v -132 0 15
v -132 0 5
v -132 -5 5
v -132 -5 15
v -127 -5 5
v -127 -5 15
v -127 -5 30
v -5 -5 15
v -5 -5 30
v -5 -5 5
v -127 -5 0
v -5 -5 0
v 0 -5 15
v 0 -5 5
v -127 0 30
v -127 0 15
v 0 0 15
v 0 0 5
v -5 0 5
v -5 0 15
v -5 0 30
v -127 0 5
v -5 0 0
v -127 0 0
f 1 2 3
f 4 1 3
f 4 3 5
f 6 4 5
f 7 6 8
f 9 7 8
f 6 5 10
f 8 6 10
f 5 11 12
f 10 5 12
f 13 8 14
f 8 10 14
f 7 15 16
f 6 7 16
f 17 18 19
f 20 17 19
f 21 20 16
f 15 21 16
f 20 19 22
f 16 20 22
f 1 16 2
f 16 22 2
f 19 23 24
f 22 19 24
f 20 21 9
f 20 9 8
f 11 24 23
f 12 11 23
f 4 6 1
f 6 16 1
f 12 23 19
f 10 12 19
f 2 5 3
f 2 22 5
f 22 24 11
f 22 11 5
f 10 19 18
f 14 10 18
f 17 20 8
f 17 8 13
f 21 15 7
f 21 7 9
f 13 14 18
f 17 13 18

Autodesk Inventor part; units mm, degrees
ref_plane "YZ Plane" through (0, 0, 0) normal (1, 0, 0) x (0, 1, 0)
ref_plane "XZ Plane" through (0, 0, 0) normal (0, 1, 0) x (-1, 0, 0)
ref_plane "XY Plane" through (0, 0, 0) normal (0, 0, 1) x (1, 0, 0)
sketch "Sketch1" plane through (0, 0, 0) normal (0, 0, 1) x (1, 0, 0)
  line L0 (0, 0) -> (-132, 0)
  line L1 (-132, 0) -> (-132, -5)
  line L2 (-132, -5) -> (0, -5)
  line L3 (0, -5) -> (0, 0)
  dimension "d0" = 5
  dimension "d1" = 132
extrude "Extrusion1" add sketch "Sketch1" along normal blind 30
sketch "Sketch2" plane through (-132, 0, 0) normal (0, 1, 0) x (1, 0, 0)
  line L0 (0, -30) -> (132, -30) projected
  line L1 (0, -30) -> (5, -30)
  line L2 (5, -30) -> (5, -15)
  line L3 (5, -15) -> (0, -15)
  line L4 (0, -15) -> (0, -30)
  line L5 (132, -30) -> (127, -30)
  line L6 (127, -30) -> (127, -15)
  line L7 (127, -15) -> (132, -15)
  line L8 (132, -15) -> (132, -30)
  line L9 (0, 0) -> (0, -30) projected
  line L10 (132, 0) -> (132, -30) projected
  line L11 (0, 0) -> (132, 0)
  line L12 (132, 0) -> (132, 0)
  line L13 (132, 0) -> (0, 0)
  line L14 (0, 0) -> (0, 0)
  line L15 (0, 0) -> (5, 0)
  line L16 (5, 0) -> (5, -5)
  line L17 (5, -5) -> (0, -5)
  line L18 (0, -5) -> (0, 0)
  line L19 (132, 0) -> (127, 0)
  line L20 (127, 0) -> (127, -5)
  line L21 (127, -5) -> (132, -5)
  line L22 (132, -5) -> (132, 0)
  point P0 (5, -30)
  point P1 (5, 0)
  point P2 (127, 0)
  dimension "d4" = 5
  dimension "d5" = 15
  dimension "d6" = 15
  dimension "d7" = 5
  dimension "d8" = 0
  dimension "d11" = 5
  dimension "d12" = 5
  dimension "d13" = 5
  dimension "d14" = 10
extrude "Extrusion2" cut sketch "Sketch2" against normal blind 10 contours L4 L3 L2 L0 | L6 L7 L8 L0 | L9 L11 L16 L17 | L21 L20 L11 L10
properties part number "FANsuport"
